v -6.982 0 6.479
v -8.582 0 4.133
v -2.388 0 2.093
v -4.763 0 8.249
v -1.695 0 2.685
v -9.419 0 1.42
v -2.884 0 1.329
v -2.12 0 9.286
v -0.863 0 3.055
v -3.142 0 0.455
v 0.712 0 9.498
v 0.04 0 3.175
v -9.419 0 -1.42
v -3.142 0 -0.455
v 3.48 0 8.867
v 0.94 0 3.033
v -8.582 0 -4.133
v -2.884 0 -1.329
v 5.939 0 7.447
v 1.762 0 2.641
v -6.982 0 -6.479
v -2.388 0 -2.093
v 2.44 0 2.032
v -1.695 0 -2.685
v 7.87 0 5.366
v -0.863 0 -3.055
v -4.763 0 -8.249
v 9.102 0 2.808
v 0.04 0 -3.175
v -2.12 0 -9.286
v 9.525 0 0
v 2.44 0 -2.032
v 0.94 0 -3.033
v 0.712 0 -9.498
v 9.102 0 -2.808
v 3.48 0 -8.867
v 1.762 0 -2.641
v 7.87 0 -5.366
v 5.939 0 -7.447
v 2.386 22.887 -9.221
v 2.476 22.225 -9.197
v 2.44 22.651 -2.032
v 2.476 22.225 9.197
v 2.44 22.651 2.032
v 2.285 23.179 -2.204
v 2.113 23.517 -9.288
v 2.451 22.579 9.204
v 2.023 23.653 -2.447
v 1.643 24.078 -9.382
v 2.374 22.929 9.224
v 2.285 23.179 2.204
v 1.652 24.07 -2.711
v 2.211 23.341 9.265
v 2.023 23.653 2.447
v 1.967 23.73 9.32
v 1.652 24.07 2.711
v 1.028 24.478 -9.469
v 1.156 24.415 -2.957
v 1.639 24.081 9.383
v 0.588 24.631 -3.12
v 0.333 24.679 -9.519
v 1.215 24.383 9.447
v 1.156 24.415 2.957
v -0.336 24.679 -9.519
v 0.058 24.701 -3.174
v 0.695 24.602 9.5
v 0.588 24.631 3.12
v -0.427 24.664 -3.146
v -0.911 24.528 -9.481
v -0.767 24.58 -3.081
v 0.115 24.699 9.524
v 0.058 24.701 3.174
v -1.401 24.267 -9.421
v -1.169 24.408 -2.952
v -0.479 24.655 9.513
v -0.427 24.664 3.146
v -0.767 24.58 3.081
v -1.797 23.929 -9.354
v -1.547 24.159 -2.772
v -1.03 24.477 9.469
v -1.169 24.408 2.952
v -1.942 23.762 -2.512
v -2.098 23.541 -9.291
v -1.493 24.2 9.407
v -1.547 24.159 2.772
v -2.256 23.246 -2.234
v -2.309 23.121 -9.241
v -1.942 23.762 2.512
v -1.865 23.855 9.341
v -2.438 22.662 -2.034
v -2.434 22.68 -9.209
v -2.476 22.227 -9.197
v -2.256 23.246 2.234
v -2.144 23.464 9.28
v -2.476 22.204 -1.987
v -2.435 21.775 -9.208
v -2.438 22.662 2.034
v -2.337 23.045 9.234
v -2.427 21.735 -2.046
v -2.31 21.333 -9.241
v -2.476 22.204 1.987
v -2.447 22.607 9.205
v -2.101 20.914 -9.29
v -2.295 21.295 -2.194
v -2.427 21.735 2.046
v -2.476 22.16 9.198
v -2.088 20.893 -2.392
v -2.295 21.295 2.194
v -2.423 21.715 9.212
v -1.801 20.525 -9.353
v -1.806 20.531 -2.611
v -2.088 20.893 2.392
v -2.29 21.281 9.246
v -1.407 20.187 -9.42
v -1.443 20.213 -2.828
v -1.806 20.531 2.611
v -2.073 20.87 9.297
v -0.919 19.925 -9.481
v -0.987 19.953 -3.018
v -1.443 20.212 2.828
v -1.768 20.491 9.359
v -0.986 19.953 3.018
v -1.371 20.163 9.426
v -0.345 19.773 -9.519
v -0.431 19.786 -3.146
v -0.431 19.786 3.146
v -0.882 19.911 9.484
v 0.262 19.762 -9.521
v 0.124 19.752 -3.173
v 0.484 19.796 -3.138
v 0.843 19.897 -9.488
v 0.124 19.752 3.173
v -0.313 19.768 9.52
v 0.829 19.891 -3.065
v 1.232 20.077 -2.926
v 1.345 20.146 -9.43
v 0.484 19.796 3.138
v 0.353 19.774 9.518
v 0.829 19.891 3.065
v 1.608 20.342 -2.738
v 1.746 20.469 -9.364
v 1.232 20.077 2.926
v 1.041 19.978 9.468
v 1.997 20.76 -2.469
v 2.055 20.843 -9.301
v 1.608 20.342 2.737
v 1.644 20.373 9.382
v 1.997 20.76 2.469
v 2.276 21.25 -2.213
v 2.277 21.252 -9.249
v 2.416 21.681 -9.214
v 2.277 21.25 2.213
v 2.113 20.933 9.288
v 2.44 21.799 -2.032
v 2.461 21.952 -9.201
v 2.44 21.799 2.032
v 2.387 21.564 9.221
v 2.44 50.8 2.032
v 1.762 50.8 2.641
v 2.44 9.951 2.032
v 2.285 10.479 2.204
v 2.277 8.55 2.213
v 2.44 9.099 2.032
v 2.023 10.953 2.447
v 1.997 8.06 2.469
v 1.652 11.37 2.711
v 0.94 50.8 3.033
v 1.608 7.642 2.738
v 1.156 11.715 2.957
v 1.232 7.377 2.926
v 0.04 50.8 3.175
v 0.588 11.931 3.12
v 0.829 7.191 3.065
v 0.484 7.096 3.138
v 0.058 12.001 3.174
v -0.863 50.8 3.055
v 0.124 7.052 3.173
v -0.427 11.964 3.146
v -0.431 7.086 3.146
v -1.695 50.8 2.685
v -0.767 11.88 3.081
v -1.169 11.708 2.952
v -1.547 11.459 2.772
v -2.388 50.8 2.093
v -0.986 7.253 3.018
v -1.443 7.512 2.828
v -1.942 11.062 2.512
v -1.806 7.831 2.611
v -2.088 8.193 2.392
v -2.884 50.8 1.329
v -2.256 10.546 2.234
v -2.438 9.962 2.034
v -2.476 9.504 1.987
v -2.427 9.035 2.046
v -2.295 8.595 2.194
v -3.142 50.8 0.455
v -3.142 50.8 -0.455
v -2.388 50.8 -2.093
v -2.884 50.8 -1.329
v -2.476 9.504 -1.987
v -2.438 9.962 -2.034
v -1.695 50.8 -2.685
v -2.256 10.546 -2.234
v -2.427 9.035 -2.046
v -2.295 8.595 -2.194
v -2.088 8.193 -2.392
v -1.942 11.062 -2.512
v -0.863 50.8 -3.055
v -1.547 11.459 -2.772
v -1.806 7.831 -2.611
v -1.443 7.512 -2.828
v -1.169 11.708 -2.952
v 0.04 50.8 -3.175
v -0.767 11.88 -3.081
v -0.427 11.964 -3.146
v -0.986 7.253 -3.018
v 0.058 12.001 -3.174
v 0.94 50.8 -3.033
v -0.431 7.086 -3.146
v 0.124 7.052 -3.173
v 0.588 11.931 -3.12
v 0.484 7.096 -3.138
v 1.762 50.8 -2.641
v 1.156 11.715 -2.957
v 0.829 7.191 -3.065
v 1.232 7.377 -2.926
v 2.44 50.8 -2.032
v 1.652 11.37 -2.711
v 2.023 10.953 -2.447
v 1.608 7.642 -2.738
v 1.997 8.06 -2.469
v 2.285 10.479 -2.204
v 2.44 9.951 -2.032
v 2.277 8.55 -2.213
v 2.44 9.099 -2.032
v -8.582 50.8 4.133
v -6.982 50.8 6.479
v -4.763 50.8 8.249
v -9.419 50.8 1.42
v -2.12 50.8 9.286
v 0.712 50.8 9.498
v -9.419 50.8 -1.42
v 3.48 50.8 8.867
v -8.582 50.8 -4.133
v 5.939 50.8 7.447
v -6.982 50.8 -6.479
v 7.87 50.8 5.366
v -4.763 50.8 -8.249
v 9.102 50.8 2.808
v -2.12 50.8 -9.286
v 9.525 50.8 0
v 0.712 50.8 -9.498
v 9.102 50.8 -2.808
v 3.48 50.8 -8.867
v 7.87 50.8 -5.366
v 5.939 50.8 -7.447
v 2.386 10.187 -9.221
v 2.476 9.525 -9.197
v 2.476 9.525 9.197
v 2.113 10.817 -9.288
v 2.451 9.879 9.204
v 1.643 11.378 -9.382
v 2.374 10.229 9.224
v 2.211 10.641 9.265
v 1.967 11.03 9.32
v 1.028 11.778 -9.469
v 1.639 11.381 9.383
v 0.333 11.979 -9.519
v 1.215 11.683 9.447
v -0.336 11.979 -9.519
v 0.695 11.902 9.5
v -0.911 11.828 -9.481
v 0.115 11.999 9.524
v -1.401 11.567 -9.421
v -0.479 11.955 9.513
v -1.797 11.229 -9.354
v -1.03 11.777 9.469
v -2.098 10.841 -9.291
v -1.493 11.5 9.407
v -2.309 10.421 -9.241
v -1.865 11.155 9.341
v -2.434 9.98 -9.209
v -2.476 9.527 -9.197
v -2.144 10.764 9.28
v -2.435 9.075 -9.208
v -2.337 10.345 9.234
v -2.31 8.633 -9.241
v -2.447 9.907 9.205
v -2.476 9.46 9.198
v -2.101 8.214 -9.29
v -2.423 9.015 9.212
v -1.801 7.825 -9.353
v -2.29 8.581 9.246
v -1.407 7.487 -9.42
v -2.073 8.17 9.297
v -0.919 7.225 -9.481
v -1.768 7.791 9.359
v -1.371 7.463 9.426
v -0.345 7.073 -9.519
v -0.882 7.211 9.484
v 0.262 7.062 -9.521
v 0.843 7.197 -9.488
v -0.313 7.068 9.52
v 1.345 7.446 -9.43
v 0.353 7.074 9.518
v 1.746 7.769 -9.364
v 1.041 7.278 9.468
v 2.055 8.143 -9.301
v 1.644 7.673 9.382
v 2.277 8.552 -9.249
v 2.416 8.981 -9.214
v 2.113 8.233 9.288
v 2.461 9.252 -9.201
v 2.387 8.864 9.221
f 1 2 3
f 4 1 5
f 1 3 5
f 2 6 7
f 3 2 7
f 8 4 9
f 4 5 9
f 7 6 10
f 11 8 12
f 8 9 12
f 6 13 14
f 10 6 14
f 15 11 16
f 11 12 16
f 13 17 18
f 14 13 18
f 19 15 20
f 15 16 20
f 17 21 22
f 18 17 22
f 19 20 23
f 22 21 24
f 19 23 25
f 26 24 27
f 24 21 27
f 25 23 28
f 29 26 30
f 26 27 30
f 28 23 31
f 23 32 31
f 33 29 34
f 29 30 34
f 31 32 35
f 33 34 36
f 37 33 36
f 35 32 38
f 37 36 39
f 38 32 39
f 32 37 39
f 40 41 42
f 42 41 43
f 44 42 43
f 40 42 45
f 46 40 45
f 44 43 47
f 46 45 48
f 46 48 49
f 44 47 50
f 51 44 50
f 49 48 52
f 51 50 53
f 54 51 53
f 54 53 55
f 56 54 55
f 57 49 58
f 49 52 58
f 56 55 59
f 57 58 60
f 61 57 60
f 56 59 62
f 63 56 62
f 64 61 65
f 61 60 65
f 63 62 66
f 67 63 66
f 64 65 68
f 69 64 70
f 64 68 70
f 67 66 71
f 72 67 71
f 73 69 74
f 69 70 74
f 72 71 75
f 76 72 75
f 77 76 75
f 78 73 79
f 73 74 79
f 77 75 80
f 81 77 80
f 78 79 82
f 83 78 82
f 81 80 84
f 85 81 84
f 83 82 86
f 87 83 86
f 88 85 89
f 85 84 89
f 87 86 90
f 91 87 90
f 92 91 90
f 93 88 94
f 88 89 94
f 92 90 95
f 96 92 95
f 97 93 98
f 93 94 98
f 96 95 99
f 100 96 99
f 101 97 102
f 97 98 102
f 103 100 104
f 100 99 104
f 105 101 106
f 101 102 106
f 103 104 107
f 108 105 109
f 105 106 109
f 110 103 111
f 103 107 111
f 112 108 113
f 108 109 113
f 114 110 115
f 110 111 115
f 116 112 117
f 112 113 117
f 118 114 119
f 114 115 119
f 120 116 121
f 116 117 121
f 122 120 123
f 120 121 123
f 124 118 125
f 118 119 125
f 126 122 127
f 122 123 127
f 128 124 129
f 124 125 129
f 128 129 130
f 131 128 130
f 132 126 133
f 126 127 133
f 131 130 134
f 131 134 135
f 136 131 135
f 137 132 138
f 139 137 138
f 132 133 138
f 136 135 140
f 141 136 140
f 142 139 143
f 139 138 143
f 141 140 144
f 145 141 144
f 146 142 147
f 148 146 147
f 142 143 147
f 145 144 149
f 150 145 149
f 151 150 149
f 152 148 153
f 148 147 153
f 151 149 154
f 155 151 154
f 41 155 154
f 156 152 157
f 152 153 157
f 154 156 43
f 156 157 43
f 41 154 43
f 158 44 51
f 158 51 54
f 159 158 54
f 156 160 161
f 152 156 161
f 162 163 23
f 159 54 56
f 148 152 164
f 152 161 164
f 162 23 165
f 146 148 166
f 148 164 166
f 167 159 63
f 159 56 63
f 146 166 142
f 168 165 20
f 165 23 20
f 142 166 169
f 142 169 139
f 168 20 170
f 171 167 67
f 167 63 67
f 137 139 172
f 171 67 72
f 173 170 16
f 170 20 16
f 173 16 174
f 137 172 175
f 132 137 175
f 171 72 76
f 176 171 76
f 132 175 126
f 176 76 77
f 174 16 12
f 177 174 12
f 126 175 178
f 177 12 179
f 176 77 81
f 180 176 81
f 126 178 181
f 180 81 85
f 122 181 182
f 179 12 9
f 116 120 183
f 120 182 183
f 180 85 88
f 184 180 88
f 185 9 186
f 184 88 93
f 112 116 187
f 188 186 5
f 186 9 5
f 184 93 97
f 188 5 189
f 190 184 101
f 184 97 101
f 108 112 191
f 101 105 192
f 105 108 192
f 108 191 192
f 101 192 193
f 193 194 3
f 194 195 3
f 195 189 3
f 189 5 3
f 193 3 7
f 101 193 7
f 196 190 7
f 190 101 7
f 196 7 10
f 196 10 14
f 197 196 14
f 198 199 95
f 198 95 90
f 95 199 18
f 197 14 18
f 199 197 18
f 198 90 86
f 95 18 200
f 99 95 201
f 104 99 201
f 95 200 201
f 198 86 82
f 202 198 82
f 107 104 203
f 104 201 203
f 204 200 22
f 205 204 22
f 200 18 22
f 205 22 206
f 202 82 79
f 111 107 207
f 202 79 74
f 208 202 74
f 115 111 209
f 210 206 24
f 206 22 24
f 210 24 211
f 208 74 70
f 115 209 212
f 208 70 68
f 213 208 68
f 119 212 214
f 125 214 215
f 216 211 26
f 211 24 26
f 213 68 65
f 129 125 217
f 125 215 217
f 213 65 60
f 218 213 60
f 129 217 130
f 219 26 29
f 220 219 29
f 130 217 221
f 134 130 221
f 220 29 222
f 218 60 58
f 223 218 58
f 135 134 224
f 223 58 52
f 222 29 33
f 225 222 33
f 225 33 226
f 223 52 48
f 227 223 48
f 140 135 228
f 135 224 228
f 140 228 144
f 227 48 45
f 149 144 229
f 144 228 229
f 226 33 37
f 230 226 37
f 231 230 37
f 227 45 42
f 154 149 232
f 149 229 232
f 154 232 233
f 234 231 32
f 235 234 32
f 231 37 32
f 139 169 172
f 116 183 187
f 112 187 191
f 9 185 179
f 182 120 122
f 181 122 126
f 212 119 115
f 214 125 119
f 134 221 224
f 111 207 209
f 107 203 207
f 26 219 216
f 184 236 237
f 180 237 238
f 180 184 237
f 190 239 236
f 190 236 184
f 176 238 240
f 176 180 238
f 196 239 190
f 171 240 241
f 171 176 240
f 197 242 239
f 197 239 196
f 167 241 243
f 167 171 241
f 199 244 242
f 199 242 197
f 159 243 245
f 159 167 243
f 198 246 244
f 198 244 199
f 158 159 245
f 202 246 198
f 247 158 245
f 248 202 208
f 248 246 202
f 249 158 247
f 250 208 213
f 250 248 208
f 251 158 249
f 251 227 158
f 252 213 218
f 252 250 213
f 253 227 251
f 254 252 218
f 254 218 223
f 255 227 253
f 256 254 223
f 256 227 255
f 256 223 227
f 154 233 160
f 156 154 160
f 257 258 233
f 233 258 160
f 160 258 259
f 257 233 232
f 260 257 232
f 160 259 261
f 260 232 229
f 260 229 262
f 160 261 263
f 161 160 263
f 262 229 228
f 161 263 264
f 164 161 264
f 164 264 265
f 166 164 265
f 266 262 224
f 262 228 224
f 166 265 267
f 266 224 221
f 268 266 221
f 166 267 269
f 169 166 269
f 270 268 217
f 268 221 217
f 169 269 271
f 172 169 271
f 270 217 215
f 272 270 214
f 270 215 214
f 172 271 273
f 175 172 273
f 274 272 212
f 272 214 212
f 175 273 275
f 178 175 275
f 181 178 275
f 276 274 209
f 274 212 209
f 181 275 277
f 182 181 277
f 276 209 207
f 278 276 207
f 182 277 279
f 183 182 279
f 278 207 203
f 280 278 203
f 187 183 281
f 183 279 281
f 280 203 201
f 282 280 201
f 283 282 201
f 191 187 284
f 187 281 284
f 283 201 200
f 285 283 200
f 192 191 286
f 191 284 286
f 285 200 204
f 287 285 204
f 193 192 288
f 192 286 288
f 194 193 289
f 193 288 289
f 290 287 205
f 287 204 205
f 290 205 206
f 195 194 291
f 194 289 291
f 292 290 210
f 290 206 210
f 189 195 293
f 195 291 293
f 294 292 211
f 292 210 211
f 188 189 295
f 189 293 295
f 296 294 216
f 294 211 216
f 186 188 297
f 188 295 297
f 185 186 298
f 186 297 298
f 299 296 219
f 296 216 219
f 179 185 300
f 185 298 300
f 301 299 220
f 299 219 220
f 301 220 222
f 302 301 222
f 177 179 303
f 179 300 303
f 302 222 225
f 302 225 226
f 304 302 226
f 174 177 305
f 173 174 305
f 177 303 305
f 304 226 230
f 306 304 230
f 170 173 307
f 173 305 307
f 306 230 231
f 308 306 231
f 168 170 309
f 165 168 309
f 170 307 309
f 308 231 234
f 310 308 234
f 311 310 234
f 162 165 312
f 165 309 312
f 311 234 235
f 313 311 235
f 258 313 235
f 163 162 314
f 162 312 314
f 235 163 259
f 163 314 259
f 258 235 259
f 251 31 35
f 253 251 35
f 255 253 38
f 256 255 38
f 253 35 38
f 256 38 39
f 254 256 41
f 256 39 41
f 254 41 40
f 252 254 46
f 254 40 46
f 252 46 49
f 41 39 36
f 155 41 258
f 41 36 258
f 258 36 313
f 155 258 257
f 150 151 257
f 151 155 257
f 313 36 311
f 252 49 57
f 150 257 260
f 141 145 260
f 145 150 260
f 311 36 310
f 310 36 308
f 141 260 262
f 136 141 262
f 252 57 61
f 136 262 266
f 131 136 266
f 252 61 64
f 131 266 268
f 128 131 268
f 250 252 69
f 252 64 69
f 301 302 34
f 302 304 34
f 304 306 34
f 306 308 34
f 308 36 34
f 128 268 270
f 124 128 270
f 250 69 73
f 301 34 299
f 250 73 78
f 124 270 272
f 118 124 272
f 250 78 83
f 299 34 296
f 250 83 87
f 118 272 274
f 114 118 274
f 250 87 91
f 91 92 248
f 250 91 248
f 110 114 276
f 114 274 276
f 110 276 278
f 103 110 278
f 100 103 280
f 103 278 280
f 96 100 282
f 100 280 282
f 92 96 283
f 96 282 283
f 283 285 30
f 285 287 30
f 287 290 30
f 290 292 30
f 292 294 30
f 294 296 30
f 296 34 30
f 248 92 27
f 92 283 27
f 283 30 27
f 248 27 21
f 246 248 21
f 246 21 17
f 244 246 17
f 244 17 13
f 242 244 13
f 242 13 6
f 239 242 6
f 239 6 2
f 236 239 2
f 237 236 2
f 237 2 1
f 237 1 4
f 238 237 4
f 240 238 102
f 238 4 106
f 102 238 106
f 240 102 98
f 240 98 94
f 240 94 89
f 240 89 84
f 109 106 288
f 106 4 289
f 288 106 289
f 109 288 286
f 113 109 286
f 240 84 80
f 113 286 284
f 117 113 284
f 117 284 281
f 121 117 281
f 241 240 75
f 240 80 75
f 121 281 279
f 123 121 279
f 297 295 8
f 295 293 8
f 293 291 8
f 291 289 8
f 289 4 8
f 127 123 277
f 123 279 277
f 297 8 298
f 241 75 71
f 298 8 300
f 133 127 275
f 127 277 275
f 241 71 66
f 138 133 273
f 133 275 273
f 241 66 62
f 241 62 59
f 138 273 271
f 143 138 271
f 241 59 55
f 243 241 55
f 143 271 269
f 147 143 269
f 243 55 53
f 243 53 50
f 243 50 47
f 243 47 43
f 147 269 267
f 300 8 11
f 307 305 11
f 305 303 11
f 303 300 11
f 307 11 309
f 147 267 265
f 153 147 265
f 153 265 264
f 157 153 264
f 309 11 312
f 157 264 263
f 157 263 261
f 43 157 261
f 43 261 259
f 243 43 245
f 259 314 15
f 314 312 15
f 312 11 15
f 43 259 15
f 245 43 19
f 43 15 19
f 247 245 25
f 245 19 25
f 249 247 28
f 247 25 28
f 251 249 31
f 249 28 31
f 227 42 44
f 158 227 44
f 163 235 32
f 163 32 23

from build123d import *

# Parameters (mm, degrees)
SKETCH1_R           = 9.525
BOSS_EXTRUDE1_DEPTH = 50.8
SKETCH2_R           = 2.4765
CUT_EXTRUDE1_DEPTH  = 20.05


with BuildPart() as part:
    # Sketch1 → Boss-Extrude1 (new body)
    with BuildSketch(Plane(origin=(0, 0, 0), x_dir=(1, 0, 0), z_dir=(0, 1, 0))):
        Circle(SKETCH1_R)
        with BuildLine():
            Line((2.439590334, 2.032), (2.439590334, -2.032))
            ThreePointArc((2.439590334, -2.032), (-3.175, 0), (2.439590334, 2.032))
        make_face(mode=Mode.SUBTRACT)
    extrude(amount=BOSS_EXTRUDE1_DEPTH)

    # Sketch2 → Cut-Extrude1 (cut, through all)
    with BuildSketch(Plane.XY.offset(9.525)):
        with Locations((0, 9.525)):
            Circle(SKETCH2_R)
        with Locations((0, 22.225)):
            Circle(SKETCH2_R)
    extrude(amount=-CUT_EXTRUDE1_DEPTH, mode=Mode.SUBTRACT)


solid = part.part
